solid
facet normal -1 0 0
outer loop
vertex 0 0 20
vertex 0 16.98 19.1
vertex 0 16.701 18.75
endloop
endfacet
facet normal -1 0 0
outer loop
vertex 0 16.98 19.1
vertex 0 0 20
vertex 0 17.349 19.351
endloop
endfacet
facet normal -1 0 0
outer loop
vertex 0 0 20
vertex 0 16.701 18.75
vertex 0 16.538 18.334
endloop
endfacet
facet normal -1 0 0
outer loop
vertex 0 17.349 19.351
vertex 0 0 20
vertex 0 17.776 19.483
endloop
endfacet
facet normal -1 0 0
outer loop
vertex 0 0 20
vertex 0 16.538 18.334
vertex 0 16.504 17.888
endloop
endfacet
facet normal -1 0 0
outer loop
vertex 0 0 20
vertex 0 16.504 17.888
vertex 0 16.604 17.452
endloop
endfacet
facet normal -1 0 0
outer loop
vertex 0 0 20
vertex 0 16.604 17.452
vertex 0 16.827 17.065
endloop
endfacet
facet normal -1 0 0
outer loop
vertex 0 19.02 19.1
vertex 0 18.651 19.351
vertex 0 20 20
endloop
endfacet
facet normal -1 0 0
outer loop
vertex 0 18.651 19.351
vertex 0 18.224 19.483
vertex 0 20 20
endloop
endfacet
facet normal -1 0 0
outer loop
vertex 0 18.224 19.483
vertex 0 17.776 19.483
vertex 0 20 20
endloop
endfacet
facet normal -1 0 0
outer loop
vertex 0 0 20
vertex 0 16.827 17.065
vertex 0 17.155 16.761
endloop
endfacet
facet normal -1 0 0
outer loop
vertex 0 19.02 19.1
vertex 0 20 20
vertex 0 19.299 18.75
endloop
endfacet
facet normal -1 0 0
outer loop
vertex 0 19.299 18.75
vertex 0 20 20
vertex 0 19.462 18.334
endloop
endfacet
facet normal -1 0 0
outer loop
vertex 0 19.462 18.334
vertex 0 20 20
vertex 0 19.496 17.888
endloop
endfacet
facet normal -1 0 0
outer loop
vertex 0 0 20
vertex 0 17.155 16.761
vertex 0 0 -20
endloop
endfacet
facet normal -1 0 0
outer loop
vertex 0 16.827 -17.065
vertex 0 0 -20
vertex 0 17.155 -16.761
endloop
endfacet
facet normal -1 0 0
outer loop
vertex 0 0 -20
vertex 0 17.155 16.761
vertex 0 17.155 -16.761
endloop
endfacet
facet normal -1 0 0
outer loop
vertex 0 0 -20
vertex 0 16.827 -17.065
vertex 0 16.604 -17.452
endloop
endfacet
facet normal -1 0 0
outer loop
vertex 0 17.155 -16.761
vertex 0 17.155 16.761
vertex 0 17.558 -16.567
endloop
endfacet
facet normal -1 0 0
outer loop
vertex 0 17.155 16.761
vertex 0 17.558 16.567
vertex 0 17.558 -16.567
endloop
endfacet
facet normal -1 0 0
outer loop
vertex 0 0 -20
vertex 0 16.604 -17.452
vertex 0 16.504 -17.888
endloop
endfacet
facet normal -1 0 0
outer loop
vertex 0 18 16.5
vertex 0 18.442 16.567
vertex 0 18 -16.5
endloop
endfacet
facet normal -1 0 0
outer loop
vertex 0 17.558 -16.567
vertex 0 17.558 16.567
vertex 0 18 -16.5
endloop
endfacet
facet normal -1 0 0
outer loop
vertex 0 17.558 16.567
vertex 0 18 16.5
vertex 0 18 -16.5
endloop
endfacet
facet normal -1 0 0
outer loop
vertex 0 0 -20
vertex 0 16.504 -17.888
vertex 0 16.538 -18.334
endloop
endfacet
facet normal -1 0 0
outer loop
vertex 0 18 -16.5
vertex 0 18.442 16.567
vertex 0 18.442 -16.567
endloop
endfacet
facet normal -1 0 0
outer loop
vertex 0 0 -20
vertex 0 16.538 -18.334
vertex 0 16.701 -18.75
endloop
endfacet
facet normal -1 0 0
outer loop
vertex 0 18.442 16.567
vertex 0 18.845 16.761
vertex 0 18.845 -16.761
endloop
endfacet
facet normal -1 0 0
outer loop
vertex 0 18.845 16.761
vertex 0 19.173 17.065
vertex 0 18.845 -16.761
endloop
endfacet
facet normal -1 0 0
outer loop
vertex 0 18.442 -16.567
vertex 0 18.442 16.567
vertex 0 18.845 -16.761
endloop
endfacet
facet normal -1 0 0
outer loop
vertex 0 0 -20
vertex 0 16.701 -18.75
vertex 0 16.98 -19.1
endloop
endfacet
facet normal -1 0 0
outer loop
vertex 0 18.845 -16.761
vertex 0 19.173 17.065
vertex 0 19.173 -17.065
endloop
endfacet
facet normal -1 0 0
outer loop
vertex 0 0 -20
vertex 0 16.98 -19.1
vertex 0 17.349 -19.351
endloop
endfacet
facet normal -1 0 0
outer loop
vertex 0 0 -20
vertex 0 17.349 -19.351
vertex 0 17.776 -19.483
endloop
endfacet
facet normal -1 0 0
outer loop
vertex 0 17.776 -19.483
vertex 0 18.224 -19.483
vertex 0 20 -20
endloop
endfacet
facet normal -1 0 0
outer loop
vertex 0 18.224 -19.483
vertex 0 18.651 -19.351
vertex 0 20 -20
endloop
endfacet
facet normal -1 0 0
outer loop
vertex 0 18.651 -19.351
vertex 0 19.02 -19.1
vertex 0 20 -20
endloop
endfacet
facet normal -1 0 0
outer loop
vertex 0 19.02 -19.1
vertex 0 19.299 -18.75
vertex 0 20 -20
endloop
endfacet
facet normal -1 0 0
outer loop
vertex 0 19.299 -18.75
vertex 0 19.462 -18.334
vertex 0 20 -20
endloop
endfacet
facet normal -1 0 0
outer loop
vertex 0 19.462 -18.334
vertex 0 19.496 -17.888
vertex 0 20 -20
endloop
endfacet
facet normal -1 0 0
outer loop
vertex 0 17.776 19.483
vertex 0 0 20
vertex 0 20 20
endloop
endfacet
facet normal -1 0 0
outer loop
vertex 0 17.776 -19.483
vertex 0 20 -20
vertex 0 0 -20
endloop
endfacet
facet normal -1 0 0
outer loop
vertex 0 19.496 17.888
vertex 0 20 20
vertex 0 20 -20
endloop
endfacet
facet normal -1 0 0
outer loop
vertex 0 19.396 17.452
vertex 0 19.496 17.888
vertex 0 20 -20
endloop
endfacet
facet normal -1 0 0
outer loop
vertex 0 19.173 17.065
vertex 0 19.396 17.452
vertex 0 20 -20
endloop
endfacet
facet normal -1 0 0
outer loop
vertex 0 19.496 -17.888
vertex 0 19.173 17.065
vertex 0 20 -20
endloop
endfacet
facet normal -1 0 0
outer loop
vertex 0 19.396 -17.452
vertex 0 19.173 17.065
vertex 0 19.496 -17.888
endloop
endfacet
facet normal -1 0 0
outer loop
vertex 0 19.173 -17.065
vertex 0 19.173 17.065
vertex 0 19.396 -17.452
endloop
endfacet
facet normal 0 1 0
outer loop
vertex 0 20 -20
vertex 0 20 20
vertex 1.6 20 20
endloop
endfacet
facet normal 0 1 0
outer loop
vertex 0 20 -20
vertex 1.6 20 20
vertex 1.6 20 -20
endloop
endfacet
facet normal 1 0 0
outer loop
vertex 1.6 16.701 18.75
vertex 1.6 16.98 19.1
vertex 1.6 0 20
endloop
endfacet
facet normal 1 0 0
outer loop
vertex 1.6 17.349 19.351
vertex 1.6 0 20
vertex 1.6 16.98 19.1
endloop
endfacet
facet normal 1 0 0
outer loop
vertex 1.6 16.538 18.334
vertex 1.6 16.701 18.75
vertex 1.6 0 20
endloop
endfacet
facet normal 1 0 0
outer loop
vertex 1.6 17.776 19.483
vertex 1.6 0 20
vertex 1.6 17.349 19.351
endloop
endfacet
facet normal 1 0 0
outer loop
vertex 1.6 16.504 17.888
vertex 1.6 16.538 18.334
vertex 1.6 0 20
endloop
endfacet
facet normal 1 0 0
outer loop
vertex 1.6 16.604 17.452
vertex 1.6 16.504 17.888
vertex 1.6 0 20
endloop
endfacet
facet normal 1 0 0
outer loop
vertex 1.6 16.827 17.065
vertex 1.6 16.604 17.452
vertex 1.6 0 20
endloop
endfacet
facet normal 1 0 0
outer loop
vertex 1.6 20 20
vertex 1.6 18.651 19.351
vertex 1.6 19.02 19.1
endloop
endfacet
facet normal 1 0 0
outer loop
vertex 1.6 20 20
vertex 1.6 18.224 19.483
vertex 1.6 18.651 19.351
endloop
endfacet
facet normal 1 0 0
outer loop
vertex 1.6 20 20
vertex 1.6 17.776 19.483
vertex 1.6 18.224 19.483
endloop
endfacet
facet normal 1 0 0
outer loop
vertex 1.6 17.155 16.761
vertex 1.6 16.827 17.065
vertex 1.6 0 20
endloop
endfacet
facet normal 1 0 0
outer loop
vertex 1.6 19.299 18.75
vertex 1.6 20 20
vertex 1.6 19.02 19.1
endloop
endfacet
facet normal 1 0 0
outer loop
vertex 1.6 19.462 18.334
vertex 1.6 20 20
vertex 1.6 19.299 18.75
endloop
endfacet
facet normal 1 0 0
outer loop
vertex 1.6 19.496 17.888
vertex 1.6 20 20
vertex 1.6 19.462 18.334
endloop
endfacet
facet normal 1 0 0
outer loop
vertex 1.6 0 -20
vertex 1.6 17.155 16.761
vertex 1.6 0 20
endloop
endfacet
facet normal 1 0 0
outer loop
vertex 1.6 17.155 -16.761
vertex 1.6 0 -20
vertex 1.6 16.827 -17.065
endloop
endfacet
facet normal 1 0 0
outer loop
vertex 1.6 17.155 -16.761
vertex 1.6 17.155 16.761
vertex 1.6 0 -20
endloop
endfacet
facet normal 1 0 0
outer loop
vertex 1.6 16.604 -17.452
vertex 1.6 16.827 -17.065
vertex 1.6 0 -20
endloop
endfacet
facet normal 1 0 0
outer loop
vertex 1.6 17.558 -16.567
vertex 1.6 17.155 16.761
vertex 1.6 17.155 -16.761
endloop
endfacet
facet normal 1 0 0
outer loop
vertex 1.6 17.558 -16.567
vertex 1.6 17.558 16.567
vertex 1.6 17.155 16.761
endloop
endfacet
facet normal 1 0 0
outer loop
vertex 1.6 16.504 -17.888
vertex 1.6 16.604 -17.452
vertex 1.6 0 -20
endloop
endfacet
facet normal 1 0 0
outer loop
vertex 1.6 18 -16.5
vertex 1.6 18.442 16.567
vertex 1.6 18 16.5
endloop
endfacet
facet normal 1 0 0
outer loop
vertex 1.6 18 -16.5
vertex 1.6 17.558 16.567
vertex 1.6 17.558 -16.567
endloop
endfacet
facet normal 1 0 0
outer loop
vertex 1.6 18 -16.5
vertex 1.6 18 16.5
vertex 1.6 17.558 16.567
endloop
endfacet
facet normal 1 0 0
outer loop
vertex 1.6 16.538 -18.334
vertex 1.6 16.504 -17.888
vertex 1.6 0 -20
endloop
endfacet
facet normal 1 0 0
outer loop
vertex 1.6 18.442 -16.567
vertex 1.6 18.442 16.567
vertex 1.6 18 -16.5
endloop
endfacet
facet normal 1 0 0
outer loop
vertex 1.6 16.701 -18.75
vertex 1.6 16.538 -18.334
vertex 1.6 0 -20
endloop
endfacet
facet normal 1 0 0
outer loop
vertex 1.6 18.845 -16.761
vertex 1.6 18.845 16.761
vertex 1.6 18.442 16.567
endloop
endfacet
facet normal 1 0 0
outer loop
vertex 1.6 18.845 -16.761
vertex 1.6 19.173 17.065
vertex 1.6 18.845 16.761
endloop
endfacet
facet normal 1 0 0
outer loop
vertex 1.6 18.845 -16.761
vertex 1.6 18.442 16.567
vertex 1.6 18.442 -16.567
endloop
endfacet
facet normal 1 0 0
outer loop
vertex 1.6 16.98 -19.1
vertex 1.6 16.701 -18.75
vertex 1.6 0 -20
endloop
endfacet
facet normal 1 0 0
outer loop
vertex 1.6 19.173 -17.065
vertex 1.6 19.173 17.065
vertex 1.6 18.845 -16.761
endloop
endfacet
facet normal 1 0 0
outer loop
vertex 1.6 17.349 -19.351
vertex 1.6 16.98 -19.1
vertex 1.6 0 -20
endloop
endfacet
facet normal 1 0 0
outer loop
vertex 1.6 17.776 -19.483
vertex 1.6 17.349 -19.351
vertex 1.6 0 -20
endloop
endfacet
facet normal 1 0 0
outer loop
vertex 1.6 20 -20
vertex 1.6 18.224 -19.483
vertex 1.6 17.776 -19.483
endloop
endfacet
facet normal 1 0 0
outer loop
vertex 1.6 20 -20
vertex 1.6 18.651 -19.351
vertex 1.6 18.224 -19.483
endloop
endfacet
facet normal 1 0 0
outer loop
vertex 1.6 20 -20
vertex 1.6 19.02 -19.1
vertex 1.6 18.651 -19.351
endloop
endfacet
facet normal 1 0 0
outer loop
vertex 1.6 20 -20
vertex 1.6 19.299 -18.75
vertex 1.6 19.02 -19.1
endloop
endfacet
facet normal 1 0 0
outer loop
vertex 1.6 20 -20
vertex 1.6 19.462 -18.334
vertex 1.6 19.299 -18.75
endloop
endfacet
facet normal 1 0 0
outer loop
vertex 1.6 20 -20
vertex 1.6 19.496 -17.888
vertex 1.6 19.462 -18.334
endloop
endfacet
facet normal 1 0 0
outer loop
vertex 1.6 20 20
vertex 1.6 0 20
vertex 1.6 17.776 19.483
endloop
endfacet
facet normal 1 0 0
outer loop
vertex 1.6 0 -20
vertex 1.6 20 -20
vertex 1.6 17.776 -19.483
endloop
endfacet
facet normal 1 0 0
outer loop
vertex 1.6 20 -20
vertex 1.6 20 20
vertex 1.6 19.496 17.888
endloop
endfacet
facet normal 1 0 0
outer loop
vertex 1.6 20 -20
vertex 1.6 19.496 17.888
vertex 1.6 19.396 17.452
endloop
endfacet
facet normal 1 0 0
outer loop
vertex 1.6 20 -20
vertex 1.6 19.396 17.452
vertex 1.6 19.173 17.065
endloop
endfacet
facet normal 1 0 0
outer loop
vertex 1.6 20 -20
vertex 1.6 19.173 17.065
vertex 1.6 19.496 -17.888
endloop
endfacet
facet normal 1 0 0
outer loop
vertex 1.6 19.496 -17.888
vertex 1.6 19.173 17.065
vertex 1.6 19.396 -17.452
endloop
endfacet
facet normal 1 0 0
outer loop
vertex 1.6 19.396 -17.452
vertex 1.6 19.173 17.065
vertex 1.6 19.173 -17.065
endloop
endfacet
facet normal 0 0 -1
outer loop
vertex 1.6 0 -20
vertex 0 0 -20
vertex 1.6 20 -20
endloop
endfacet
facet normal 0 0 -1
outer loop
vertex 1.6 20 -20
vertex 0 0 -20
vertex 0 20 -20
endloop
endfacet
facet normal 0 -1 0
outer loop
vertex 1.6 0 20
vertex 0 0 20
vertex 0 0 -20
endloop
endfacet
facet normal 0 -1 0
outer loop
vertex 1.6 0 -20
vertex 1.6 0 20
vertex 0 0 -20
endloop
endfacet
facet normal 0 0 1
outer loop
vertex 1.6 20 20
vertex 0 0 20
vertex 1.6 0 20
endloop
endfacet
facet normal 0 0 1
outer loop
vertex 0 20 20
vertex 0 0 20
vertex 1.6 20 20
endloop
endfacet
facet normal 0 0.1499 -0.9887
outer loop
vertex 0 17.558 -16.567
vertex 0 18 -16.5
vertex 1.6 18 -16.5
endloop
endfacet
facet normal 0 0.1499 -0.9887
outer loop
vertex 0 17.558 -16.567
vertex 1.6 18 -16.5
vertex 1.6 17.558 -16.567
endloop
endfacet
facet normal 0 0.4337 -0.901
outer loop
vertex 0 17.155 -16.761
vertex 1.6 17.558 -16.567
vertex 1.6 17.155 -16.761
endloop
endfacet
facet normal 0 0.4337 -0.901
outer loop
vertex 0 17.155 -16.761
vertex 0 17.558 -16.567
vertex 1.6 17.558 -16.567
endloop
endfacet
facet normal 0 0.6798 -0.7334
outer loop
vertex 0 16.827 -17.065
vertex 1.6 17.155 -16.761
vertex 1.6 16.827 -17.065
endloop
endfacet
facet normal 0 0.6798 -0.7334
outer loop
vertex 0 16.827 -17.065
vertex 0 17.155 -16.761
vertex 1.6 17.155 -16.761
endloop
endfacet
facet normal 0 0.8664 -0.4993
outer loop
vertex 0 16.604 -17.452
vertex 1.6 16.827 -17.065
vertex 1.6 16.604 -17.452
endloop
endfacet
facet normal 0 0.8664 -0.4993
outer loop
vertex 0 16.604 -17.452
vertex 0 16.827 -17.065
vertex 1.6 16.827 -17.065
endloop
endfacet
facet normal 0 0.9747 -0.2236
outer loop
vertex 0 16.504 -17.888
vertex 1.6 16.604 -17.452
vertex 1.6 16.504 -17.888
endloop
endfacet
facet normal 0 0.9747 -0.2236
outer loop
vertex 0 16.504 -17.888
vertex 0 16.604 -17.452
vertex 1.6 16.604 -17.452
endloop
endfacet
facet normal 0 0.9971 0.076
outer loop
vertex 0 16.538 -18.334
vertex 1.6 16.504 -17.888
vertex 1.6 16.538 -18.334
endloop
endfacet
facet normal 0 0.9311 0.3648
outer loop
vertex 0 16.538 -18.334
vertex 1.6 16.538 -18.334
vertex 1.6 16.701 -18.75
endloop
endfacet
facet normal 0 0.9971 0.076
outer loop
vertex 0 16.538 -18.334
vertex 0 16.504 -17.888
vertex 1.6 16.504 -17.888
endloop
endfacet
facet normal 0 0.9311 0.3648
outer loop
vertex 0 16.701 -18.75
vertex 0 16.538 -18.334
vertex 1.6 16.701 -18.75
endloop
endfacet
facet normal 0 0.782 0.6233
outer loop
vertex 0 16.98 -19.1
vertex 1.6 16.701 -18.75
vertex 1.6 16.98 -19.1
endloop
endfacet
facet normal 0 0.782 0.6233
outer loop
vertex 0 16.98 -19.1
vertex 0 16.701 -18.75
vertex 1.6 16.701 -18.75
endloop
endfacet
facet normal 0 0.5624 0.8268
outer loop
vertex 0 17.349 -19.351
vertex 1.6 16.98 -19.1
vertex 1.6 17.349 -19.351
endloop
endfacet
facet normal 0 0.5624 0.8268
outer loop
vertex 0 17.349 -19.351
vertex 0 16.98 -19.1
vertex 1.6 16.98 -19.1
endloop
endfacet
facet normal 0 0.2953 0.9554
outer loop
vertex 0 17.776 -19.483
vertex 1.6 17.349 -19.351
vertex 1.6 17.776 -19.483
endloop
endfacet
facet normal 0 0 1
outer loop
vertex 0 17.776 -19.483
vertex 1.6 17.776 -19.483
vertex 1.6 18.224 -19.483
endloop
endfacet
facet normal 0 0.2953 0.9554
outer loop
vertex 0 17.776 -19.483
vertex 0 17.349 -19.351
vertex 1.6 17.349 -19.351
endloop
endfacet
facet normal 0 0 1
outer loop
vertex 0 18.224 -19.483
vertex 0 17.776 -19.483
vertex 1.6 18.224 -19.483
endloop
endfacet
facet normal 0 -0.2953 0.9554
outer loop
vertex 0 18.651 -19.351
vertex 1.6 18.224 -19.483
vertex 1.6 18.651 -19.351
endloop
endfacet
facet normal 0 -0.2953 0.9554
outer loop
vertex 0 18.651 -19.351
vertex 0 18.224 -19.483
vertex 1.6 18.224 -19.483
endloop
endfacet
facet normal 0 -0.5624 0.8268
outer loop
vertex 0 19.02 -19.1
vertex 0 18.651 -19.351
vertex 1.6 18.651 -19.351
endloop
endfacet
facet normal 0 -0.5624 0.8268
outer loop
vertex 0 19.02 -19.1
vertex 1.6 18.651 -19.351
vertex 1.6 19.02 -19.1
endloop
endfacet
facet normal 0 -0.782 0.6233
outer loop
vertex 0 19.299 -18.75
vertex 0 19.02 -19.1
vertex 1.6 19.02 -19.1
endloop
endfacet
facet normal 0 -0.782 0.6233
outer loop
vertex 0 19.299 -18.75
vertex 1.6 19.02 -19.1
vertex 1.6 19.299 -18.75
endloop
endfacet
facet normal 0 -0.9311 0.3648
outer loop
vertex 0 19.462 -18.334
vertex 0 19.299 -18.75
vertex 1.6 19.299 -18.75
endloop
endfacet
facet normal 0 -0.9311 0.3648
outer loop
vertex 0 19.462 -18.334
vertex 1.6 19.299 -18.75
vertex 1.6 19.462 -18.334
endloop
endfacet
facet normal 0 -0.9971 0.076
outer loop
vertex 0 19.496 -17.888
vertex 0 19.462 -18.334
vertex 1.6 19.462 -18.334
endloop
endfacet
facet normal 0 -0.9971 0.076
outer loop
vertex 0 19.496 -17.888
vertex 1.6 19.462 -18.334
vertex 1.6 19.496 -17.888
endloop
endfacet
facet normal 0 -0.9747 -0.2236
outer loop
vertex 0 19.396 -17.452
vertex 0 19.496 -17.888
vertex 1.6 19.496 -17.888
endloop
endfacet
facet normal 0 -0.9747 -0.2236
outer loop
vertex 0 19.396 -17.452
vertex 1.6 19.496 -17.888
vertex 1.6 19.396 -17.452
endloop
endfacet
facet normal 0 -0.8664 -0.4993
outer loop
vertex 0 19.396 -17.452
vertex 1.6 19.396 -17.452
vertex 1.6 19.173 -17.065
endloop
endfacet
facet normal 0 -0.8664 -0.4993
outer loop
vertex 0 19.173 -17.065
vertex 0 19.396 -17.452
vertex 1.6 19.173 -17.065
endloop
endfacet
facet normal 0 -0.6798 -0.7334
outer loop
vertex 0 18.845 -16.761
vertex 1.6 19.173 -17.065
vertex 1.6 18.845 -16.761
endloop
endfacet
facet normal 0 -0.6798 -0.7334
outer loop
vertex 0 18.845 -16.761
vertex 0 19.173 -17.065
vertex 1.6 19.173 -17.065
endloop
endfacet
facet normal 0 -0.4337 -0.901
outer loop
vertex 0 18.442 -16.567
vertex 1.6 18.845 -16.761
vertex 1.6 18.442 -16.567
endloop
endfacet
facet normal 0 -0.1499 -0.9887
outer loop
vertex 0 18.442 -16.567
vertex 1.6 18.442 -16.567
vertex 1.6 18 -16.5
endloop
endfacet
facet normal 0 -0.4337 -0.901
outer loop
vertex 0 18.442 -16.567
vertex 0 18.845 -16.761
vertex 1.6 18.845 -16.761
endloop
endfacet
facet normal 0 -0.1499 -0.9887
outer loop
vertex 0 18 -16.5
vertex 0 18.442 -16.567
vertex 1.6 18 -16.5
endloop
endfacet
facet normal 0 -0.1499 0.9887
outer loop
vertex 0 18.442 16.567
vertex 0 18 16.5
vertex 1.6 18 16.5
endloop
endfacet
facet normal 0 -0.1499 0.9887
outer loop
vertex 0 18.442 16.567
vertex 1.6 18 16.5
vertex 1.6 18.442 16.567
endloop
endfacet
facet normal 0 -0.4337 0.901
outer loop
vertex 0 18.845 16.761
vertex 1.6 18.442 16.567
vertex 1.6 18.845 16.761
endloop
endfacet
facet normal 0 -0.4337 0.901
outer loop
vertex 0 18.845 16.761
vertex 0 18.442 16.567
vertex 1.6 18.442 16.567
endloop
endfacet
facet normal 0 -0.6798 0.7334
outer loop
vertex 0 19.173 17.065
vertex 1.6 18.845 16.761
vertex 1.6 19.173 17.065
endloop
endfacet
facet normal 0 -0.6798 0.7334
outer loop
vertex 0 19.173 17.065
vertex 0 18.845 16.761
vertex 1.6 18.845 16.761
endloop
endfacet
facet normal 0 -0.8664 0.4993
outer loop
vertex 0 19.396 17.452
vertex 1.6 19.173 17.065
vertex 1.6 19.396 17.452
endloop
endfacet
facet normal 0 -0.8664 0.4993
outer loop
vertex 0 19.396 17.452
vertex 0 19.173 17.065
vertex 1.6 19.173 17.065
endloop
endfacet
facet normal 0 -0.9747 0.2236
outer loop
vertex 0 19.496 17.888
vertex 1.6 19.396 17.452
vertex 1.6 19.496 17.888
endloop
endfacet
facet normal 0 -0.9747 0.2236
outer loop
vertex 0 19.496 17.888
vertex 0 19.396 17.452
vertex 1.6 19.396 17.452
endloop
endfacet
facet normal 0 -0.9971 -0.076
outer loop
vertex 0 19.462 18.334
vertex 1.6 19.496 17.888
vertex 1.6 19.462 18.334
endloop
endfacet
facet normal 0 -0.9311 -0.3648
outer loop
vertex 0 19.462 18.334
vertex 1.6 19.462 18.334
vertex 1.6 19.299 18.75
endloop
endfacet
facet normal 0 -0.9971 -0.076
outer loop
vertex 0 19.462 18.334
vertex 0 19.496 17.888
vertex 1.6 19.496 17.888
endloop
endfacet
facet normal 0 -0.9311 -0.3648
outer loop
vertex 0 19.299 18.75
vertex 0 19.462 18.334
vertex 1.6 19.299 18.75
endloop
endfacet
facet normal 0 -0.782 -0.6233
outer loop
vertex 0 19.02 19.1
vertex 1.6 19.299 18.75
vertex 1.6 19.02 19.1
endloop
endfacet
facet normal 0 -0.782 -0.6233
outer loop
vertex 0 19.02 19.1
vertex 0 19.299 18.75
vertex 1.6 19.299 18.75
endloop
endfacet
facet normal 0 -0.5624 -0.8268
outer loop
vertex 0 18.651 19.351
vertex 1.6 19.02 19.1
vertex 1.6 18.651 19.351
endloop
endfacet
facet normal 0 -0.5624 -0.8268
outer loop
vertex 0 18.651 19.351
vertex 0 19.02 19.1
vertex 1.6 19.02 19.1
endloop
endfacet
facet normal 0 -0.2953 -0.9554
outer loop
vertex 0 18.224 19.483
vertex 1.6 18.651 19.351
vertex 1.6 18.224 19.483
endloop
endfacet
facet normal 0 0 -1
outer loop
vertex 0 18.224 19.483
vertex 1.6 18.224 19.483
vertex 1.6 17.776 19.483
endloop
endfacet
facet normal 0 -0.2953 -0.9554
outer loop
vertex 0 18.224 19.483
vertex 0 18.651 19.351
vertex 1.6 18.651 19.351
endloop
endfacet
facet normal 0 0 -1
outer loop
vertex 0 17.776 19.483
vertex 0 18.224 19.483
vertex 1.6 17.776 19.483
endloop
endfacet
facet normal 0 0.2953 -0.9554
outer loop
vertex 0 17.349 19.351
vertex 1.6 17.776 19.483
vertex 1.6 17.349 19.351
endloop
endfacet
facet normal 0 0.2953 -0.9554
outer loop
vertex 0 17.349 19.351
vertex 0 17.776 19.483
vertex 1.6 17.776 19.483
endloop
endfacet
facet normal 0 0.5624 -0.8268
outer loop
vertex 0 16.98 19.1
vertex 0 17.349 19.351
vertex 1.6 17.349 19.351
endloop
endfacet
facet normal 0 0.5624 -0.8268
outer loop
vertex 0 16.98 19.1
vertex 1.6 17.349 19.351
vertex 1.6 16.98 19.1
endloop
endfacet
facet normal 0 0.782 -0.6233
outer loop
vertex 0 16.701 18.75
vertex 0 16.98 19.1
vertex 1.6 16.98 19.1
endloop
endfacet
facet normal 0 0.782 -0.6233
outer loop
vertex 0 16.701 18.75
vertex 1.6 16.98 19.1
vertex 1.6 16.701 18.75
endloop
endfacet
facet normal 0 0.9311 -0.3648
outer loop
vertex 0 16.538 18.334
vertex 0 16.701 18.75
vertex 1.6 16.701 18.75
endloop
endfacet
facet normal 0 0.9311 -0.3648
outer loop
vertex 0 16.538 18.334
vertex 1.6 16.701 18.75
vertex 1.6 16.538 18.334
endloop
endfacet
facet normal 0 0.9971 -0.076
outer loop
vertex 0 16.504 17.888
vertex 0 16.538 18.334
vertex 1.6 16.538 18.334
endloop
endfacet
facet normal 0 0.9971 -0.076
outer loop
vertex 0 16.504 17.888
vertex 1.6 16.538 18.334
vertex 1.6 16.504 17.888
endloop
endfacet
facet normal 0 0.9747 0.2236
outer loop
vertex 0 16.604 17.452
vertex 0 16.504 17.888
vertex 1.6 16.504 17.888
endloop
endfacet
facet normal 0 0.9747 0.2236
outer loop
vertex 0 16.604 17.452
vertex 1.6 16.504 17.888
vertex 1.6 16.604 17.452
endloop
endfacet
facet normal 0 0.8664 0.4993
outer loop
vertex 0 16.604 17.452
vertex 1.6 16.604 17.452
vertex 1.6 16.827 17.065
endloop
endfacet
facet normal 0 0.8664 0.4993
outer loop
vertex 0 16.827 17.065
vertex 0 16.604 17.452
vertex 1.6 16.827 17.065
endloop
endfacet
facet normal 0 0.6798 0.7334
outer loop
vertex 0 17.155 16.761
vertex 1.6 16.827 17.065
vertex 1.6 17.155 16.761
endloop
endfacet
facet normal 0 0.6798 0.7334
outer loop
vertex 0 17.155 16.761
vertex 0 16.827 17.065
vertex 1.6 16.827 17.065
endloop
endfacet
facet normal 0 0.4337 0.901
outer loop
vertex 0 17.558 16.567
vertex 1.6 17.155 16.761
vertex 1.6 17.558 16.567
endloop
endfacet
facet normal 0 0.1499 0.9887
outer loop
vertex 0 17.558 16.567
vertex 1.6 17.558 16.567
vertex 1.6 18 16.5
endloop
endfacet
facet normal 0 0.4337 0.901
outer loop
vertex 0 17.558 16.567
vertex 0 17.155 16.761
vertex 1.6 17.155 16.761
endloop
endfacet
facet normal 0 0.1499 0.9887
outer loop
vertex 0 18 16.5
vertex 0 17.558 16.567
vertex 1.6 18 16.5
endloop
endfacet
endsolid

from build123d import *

# Parameters (mm, degrees)
ESQUISSE1_W      = 40
ESQUISSE1_H      = 20
ESQUISSE1_R      = 1.5
EXTRUSION1_DEPTH = 1.6


with BuildPart() as part:
    # Esquisse1 → Extrusion1 (new body)
    with BuildSketch(Plane(origin=(0, 0, 0), x_dir=(0, 0, -1), z_dir=(1, 0, 0))):
        with Locations((0, 10)):
            Rectangle(ESQUISSE1_W, ESQUISSE1_H)
        with Locations((-18, 18)):
            Circle(ESQUISSE1_R, mode=Mode.SUBTRACT)
        with Locations(Location((18, 18, 0), (0, 0, 180))):
            Circle(ESQUISSE1_R, mode=Mode.SUBTRACT)
    extrude(amount=EXTRUSION1_DEPTH)


solid = part.part
